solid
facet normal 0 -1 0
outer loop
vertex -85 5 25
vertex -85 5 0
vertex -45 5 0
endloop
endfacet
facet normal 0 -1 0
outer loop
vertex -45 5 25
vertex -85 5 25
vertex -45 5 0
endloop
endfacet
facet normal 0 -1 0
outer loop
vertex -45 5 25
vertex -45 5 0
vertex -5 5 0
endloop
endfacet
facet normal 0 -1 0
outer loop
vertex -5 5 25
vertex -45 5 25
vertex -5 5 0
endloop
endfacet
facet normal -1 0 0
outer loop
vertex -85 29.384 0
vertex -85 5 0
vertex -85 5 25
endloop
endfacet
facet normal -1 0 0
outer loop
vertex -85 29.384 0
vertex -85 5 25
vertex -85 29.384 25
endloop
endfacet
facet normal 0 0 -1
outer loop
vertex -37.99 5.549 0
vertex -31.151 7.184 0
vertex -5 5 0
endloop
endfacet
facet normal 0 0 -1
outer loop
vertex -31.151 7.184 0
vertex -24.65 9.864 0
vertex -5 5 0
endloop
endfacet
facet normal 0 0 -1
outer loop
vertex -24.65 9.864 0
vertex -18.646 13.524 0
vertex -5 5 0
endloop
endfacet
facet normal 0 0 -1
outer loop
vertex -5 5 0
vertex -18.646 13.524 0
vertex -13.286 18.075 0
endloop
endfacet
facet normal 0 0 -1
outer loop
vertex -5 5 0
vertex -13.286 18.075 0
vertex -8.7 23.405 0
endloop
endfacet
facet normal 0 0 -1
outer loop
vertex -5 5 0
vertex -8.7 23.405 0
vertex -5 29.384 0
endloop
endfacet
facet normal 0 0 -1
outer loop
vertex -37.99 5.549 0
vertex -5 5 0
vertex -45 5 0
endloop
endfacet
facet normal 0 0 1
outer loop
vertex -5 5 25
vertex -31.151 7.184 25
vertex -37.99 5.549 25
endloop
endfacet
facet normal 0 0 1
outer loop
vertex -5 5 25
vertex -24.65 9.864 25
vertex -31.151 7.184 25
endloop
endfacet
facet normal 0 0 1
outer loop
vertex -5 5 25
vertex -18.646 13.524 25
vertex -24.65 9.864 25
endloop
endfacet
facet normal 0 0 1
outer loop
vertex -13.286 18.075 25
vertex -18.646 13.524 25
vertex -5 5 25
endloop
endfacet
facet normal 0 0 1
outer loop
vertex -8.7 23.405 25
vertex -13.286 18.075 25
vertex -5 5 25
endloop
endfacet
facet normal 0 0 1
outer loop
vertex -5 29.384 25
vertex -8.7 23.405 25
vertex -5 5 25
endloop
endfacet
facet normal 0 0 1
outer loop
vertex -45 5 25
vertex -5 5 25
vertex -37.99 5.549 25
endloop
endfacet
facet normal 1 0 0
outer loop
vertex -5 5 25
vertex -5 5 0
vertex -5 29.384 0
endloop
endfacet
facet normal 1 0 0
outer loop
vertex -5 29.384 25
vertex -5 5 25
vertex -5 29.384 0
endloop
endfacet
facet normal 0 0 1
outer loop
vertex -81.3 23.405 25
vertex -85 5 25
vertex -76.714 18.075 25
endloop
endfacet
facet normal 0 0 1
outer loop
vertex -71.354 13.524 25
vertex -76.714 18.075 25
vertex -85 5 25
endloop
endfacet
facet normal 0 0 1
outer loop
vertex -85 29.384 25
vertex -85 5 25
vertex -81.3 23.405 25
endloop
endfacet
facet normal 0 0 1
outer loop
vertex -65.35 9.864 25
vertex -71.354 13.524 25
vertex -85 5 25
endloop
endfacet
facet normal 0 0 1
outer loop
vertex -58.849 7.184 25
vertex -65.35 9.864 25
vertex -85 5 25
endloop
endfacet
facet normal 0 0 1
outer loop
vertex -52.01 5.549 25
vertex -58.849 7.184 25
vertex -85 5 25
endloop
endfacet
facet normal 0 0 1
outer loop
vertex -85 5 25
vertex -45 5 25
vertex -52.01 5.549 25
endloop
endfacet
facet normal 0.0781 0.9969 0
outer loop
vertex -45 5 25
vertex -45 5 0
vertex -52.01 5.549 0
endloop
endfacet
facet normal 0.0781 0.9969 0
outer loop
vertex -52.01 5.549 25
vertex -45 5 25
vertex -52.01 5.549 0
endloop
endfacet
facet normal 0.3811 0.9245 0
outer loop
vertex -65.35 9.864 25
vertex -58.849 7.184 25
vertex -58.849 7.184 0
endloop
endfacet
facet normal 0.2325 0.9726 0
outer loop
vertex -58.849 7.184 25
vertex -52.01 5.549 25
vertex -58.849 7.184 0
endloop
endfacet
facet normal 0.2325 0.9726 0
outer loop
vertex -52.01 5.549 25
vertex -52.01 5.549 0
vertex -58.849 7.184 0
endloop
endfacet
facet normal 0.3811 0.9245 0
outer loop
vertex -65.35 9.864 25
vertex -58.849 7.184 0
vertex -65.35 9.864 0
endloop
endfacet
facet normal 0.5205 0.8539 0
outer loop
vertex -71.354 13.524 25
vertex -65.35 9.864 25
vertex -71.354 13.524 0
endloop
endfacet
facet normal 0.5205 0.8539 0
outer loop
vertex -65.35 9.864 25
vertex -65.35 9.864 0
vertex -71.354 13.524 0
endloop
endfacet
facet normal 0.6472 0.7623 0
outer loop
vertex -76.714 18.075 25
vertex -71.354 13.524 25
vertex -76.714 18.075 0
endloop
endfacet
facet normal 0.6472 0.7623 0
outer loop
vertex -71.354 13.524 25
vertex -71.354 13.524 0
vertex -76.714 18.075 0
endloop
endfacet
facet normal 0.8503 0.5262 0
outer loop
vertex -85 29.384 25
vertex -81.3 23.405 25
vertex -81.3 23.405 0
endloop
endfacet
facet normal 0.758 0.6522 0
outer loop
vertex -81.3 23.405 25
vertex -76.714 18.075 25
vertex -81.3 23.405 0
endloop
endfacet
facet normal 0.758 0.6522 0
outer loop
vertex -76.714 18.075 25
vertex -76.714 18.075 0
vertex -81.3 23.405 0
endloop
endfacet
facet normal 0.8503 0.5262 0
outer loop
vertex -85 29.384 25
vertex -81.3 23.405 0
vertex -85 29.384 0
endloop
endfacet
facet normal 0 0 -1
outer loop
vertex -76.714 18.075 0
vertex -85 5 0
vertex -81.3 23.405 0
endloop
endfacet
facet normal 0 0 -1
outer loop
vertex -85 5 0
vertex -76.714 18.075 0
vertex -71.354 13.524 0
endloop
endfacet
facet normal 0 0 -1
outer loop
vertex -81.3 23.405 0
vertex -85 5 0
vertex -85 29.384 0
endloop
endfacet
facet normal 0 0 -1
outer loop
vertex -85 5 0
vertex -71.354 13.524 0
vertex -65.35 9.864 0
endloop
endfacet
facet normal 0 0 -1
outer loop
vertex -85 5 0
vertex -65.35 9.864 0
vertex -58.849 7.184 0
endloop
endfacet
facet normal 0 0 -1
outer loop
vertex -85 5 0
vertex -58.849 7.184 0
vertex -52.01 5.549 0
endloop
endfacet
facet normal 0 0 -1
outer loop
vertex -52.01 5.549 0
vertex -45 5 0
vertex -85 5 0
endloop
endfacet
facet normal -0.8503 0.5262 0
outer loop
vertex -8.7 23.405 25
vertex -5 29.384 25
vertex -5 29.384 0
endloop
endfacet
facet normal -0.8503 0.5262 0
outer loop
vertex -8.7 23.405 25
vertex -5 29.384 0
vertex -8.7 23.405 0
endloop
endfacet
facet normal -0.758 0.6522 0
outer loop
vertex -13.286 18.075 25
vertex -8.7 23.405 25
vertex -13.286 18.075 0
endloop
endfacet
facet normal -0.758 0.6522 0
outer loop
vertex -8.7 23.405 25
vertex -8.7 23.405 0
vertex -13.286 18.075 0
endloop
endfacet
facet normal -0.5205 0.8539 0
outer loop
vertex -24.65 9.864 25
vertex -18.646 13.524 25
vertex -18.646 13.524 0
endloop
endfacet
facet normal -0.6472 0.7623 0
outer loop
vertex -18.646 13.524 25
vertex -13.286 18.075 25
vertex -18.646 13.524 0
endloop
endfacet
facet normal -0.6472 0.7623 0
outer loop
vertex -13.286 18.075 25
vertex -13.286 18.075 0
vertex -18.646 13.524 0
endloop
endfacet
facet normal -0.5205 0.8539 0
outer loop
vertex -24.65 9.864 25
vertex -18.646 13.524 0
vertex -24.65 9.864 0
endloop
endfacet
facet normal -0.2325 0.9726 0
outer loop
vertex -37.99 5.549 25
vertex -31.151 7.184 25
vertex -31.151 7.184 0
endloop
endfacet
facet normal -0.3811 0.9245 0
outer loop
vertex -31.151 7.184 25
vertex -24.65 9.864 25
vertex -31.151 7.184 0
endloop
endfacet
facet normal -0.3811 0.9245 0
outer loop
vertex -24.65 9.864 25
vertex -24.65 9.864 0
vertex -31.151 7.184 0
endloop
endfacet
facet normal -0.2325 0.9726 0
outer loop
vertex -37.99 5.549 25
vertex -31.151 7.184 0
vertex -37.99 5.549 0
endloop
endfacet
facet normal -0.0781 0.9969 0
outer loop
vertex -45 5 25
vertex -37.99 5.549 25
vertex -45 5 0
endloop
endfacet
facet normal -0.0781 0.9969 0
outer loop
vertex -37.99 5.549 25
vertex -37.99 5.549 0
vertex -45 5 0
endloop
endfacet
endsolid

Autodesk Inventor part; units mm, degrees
ref_plane "YZ Plane" through (0, 0, 0) normal (1, 0, 0) x (0, 1, 0)
ref_plane "XZ Plane" through (0, 0, 0) normal (0, 1, 0) x (-1, 0, 0)
ref_plane "XY Plane" through (0, 0, 0) normal (0, 0, 1) x (1, 0, 0)
sketch "スケッチ1" plane through (0, 0, 0) normal (0, 0, 1) x (1, 0, 0)
  line L0 (-5, 5) -> (-5, 29.3845)
  line L1 (-85, 5) -> (-85, 29.3845)
  arc A0 (-85, 29.3845) -> (-5, 29.3845) centre (-45, 50) ccw
  line L2 (-85, 5) -> (-5, 5)
  line L3 (-85, 5) -> (-5, 5)
  arc A1 (-85, 29.3845) -> (-5, 29.3845) centre (-45, 50) ccw
  line L4 (-85, 29.3845) -> (-85, 5)
  line L5 (-5, 29.3845) -> (-5, 5)
  line L6 (-5, 5) -> (-85, 5)
  line L7 (-85, 5) -> (-5, 5)
  line L8 (-5, 5) -> (-5, 29.3845)
  line L9 (-5, 29.3845) -> (-85, 29.3845)
  line L10 (-85, 29.3845) -> (-85, 5)
  arc A2 (-85, 29.3845) -> (-5, 29.3845) centre (-45, 50) ccw
  point P0 (0, 0)
extrude "押し出し1" add sketch "スケッチ1" along normal blind 25 contours L2 A0 L0 | L2 L1 A0
properties part number "知能ロボコン発射台つなぎ"
